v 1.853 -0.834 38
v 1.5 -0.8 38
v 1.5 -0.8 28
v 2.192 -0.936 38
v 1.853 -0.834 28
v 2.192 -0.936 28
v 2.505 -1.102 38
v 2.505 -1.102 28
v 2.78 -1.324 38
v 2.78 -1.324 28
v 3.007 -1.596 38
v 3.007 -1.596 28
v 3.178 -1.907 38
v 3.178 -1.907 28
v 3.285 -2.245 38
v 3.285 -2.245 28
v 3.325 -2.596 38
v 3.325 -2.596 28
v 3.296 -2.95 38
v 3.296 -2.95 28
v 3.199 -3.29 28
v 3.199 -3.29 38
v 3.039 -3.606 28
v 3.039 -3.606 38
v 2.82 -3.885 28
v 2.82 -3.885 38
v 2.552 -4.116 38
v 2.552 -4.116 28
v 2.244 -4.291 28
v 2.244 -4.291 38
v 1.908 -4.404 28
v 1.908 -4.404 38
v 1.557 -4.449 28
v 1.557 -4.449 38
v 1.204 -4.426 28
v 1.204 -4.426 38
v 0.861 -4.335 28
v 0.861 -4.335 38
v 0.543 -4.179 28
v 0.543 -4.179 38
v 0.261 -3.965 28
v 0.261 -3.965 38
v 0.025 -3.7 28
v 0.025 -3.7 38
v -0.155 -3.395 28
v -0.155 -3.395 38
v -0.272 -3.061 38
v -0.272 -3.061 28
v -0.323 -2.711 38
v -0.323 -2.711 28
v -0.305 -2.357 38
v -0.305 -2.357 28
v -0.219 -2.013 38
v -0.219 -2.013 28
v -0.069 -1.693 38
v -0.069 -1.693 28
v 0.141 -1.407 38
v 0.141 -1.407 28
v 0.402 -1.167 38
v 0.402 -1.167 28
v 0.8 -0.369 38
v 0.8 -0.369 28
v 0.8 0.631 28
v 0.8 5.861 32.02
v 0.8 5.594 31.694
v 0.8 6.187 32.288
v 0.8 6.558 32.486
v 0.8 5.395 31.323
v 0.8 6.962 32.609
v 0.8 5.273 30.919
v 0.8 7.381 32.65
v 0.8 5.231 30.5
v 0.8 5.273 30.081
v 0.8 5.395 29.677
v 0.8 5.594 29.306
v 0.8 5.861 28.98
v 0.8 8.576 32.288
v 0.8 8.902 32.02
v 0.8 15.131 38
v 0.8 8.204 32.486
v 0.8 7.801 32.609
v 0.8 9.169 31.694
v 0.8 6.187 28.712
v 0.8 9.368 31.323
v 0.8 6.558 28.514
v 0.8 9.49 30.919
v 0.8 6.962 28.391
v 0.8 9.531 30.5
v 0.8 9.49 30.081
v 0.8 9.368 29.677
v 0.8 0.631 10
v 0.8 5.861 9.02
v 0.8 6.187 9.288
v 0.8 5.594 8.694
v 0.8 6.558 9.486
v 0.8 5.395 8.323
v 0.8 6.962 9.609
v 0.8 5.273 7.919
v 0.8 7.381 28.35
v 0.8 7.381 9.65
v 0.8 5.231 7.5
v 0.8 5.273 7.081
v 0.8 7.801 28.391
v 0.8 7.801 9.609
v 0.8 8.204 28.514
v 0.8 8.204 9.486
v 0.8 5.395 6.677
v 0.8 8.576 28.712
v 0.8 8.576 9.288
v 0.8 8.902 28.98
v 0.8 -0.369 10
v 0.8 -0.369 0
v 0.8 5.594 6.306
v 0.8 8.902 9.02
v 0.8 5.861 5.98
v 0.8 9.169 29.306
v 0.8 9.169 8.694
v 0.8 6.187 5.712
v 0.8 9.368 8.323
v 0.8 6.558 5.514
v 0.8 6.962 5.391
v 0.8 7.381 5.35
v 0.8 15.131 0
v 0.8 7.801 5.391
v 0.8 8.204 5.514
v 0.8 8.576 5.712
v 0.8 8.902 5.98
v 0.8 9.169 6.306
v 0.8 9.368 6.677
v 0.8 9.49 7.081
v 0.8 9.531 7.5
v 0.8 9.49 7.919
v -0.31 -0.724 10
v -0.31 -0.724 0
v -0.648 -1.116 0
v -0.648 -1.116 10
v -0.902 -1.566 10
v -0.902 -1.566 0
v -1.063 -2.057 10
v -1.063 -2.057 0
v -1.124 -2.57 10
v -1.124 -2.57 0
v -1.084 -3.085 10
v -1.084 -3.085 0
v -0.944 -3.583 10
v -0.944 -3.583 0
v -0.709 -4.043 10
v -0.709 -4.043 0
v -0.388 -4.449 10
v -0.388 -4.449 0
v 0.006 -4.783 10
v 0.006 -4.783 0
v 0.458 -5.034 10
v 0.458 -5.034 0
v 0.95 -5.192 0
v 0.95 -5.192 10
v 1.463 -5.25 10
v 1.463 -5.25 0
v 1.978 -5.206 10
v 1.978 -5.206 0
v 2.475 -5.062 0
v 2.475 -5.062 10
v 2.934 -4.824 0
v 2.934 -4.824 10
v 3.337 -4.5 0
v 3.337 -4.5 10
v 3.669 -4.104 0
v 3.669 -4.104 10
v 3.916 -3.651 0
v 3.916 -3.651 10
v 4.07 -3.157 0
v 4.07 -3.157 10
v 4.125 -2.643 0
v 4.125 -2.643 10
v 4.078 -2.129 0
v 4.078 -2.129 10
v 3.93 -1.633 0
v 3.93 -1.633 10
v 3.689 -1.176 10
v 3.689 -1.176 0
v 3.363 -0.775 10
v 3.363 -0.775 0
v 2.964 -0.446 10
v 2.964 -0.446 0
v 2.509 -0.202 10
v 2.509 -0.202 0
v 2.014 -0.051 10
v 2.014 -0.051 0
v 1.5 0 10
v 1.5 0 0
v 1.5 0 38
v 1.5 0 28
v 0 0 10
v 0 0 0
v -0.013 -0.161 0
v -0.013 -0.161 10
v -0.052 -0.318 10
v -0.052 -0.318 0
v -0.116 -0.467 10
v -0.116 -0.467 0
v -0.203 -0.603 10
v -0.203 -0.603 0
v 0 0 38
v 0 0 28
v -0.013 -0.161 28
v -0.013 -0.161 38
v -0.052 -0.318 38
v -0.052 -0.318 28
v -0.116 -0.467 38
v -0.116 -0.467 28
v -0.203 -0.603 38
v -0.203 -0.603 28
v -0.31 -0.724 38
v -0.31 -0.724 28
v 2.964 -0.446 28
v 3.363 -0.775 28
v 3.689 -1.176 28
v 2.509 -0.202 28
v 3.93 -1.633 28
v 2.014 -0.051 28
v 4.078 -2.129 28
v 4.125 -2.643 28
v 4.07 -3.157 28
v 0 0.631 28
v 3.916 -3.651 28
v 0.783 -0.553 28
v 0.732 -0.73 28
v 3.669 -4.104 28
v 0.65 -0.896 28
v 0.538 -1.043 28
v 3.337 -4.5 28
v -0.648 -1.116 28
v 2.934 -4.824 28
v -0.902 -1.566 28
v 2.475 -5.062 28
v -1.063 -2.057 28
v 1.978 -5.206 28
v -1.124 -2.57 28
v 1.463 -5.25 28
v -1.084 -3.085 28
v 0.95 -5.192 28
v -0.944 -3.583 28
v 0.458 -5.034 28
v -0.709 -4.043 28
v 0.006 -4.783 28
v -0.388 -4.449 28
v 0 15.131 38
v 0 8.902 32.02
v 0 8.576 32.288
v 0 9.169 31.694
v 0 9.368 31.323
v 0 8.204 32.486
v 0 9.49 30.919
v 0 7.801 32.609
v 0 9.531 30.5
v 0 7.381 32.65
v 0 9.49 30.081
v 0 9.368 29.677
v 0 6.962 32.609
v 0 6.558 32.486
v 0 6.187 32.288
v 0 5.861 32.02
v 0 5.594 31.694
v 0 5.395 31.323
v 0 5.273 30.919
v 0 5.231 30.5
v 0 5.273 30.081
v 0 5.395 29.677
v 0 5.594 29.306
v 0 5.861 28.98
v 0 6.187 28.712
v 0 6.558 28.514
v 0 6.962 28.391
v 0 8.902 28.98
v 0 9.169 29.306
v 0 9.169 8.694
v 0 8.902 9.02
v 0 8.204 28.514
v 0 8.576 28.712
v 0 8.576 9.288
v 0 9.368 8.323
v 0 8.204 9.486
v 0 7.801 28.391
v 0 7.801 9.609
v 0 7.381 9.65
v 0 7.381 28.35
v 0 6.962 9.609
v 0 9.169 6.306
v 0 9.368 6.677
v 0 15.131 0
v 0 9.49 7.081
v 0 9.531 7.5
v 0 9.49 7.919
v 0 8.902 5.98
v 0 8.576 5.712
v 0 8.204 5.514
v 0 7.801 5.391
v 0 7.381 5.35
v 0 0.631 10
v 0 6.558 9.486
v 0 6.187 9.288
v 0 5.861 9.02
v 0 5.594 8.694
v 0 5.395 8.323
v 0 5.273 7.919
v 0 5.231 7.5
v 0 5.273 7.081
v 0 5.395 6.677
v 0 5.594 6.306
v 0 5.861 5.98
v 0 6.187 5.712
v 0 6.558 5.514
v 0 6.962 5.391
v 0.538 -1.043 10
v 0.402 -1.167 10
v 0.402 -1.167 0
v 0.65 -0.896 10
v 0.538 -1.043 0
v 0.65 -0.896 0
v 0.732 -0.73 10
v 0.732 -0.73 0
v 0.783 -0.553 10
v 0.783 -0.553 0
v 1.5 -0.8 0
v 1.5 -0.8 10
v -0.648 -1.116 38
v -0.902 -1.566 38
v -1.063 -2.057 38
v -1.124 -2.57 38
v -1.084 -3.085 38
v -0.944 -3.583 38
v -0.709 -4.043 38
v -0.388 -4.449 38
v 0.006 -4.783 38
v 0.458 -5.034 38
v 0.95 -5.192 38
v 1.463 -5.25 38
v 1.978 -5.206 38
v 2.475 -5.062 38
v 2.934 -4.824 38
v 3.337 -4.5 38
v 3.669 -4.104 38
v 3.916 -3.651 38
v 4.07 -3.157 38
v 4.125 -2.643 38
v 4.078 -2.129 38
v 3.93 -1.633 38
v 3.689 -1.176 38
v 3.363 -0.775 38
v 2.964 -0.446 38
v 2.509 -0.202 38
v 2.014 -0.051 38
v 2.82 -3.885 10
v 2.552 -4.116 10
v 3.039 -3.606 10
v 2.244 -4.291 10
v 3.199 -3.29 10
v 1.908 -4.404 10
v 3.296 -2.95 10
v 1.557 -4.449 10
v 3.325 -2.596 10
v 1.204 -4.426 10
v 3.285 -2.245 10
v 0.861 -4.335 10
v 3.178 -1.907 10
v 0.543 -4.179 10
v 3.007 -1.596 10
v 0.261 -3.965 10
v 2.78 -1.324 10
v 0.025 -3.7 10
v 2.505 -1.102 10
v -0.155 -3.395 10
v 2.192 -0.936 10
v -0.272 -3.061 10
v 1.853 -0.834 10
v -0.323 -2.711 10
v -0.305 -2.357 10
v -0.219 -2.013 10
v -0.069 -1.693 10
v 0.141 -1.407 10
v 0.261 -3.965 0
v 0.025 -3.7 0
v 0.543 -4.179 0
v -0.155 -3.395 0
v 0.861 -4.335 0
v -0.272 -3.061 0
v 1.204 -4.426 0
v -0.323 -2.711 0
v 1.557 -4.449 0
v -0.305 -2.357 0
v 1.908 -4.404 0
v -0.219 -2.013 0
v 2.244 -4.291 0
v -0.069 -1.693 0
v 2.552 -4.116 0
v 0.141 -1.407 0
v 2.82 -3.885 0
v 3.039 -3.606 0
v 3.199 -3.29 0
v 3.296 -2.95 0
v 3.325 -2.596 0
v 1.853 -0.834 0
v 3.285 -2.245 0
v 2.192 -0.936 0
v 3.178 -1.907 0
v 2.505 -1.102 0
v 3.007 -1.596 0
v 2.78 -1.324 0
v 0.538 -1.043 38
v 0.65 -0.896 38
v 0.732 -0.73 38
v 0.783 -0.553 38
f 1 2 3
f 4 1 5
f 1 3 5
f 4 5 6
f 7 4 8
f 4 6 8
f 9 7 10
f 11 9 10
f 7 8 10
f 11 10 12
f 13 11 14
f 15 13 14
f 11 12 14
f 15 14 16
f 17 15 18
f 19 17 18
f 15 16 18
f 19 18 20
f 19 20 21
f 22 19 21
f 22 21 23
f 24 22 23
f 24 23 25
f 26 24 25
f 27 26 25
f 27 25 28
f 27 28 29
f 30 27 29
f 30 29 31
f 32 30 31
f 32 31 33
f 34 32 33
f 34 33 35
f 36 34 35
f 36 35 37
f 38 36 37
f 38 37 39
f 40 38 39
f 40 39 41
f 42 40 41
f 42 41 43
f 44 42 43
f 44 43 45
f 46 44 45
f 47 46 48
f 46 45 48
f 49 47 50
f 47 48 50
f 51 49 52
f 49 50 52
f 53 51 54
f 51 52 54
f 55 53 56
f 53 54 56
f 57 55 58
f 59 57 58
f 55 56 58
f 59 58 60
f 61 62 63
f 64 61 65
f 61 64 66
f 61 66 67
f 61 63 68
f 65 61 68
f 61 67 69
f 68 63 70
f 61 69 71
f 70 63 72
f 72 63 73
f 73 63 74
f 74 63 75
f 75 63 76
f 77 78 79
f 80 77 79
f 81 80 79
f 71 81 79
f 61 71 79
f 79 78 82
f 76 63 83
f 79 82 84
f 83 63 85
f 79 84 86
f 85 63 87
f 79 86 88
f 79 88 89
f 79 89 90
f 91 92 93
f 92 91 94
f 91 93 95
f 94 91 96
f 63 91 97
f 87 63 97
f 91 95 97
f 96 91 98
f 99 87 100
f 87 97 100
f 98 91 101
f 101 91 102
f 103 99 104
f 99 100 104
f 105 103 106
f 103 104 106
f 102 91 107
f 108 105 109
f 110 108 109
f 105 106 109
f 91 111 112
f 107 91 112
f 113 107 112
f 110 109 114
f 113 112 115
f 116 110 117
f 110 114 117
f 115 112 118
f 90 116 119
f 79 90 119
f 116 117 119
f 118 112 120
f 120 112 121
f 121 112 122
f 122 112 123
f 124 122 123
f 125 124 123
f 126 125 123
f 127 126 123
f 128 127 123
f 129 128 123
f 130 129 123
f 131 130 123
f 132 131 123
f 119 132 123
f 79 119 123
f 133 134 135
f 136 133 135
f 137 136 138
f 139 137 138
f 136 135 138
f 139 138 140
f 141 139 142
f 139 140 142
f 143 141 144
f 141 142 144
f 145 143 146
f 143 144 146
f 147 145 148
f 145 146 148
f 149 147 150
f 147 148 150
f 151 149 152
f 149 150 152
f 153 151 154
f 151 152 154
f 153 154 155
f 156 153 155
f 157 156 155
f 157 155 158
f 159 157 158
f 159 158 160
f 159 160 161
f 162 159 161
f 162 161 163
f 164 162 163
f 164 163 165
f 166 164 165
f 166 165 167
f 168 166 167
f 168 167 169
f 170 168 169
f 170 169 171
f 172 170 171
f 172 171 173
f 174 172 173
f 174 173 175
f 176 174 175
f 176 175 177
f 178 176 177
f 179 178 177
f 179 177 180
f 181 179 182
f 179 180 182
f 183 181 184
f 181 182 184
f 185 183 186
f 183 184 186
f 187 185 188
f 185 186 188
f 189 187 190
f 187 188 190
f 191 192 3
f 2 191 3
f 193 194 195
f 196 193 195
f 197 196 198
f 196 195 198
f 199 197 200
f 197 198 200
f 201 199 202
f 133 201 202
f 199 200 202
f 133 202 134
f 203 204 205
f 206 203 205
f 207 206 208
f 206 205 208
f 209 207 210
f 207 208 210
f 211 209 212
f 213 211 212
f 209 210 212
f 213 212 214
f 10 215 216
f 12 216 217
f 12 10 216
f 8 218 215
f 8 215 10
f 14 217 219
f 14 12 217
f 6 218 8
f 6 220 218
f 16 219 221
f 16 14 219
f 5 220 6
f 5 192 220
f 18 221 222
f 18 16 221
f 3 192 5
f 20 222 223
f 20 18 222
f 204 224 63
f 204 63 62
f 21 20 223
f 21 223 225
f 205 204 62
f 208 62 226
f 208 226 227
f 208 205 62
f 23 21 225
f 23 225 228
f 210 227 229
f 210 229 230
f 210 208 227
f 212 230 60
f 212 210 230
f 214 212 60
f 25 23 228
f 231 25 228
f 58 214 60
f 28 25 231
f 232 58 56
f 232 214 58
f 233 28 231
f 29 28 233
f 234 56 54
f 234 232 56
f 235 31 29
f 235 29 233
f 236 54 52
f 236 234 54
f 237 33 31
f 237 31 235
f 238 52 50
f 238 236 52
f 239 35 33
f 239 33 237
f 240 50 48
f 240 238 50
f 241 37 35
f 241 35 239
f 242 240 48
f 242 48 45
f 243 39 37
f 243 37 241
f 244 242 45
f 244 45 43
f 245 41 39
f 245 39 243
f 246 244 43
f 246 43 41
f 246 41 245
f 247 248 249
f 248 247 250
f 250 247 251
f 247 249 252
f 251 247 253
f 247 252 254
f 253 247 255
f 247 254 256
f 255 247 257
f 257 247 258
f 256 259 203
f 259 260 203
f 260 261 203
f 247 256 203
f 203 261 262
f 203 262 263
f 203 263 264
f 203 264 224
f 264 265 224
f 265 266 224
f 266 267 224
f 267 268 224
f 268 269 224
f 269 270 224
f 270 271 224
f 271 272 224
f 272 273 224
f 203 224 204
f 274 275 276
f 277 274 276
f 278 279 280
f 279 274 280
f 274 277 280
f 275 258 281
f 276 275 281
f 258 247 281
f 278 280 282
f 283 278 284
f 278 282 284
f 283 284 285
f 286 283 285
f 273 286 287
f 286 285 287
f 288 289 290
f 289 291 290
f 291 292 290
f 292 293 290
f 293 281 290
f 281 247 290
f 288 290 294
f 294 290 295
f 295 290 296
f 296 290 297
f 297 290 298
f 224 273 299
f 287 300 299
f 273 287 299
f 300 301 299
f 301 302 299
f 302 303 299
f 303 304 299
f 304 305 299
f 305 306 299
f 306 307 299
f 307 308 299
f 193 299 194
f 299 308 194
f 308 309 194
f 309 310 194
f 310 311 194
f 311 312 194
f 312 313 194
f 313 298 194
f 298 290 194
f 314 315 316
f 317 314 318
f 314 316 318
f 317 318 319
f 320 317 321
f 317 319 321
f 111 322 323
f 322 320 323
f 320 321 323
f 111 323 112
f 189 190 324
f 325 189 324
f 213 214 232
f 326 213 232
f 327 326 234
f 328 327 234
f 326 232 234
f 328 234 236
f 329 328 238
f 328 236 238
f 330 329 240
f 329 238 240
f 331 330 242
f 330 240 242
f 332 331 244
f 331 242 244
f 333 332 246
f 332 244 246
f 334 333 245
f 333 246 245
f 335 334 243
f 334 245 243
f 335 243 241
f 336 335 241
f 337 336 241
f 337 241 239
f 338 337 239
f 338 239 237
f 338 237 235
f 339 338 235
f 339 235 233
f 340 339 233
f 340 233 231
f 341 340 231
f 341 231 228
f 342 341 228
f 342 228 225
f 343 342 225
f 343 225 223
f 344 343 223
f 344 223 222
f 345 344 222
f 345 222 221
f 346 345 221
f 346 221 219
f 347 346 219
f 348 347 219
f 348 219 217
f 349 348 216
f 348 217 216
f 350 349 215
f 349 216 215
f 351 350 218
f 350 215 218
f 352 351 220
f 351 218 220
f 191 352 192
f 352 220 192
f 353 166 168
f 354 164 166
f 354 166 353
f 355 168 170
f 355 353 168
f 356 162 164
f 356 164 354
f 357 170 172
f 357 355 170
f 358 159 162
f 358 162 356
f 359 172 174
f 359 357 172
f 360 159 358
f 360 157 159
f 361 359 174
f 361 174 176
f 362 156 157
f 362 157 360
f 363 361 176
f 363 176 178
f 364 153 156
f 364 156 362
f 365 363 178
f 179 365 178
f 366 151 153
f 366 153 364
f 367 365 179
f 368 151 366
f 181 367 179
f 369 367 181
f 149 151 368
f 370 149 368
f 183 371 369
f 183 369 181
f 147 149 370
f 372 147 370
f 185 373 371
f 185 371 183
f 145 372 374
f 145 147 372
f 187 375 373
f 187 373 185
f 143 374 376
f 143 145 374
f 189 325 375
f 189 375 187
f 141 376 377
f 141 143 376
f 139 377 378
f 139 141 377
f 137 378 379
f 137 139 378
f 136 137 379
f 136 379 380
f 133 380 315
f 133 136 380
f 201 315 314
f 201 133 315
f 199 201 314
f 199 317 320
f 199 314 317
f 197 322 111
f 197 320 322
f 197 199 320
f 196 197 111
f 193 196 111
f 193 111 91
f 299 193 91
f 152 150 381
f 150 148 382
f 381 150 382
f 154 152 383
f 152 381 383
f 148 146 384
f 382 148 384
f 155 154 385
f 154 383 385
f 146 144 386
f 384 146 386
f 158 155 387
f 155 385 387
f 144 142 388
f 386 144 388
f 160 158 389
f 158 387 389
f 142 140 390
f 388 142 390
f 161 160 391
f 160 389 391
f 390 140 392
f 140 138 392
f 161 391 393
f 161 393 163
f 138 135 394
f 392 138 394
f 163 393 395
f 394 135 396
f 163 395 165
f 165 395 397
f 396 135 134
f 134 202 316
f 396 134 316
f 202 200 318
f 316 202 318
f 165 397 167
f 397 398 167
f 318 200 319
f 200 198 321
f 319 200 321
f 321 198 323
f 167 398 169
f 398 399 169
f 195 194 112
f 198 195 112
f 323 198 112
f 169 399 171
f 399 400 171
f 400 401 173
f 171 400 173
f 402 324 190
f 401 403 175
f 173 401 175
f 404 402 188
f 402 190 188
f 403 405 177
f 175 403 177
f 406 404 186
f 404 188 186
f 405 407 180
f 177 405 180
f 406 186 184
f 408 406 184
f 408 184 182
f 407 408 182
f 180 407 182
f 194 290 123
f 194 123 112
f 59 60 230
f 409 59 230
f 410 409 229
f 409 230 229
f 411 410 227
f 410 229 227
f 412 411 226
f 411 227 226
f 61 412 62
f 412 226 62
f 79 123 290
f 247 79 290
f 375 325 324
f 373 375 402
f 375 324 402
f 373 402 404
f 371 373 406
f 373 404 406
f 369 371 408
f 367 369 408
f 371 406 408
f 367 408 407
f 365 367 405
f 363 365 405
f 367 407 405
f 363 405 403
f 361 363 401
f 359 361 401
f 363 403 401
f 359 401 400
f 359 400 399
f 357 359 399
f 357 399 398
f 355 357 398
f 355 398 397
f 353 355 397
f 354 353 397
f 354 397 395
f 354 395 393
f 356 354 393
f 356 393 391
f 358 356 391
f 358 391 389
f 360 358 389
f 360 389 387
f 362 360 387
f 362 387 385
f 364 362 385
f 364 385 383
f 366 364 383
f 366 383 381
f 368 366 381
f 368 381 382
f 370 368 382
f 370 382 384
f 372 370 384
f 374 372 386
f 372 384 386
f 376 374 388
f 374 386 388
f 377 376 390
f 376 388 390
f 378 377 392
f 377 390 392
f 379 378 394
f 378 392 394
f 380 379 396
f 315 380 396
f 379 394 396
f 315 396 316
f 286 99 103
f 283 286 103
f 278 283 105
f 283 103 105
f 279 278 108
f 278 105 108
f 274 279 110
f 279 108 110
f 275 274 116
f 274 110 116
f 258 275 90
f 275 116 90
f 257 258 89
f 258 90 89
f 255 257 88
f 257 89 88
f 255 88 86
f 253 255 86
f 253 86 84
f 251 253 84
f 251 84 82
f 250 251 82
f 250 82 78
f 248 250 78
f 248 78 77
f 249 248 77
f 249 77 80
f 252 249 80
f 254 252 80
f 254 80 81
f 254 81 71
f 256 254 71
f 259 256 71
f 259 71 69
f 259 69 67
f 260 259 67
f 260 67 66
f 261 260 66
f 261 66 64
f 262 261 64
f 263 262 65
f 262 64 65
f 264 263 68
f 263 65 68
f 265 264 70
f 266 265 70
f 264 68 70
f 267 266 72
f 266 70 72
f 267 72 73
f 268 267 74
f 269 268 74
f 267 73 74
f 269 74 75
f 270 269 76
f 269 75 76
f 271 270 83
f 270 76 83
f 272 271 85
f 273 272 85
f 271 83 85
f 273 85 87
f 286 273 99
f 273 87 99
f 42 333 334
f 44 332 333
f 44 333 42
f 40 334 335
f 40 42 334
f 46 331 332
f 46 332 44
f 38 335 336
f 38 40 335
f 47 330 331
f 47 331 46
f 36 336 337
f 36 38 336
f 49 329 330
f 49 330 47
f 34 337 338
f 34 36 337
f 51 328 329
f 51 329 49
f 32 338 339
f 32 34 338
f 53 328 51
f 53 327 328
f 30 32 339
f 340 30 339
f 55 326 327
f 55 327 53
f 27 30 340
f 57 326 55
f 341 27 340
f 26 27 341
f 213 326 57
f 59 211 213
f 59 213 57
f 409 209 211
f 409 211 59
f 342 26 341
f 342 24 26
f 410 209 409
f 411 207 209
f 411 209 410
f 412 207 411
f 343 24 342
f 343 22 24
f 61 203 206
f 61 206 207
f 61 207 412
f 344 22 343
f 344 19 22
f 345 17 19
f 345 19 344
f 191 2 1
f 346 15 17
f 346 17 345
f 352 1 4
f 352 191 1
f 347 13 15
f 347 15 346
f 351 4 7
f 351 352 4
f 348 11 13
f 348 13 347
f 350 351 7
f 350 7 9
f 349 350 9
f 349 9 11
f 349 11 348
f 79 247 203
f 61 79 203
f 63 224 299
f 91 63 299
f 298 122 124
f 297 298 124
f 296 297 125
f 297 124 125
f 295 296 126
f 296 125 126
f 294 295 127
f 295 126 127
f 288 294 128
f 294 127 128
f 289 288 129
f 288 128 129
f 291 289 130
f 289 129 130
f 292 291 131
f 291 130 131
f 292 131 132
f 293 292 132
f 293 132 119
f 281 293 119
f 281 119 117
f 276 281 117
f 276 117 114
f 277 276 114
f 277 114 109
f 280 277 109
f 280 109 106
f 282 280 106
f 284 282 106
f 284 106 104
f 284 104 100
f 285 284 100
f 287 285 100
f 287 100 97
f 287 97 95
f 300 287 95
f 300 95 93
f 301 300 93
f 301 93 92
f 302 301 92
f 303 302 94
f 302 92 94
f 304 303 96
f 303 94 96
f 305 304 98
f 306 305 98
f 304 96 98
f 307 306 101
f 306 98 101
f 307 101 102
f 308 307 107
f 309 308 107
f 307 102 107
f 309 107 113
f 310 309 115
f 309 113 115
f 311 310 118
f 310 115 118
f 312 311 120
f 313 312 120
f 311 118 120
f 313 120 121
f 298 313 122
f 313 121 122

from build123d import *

# Parameters (mm, degrees)
BOSS_EXTRUDE1_DEPTH     = 38
CUT_EXTRUDE1_REACH      = 43.037
SKETCH2_R               = 2.15
CUT_EXTRUDE4_DEPTH      = 42.036691991
CUT_EXTRUDE4_DEPTH_BACK = 42.036691991
SKETCH3_W               = 18
SKETCH3_H               = 1
SKETCH3_H_2             = 4.881241343


with BuildPart() as part:
    # Sketch1 → Boss-Extrude1 (new body)
    with BuildSketch(Plane.XY):
        with BuildLine():
            Line((0.8, -0.368758657), (0.8, 15.131241343))
            Line((0.8, 15.131241343), (0, 15.131241343))
            Line((0, 15.131241343), (0, 0))
            ThreePointArc((0, 0), (-0.08085497, -0.393919299), (-0.310344828, -0.724137931))
            ThreePointArc((-0.310344828, -0.724137931), (2.474900525, -5.062251314), (1.5, 0))
            Line((1.5, 0), (1.5, -0.8))
            ThreePointArc((1.5, -0.8), (2.079032119, -4.355707025), (0.401769912, -1.167428159))
            ThreePointArc((0.401769912, -1.167428159), (0.69492176, -0.814981745), (0.8, -0.368758657))
        make_face()
    extrude(amount=BOSS_EXTRUDE1_DEPTH)

    # Sketch2 → Cut-Extrude1 (cut, up to next)
    with BuildSketch(Plane(origin=(0.8, 0, 0), x_dir=(0, 0, -1), z_dir=(1, 0, 0)), mode=Mode.PRIVATE) as cut_extrude1_sk1:
        with Locations((-30.5, 7.381241343)):
            Circle(SKETCH2_R)
    cut_extrude1_tool1 = extrude(cut_extrude1_sk1.sketch, amount=-CUT_EXTRUDE1_REACH, mode=Mode.PRIVATE) & part.part
    # Sketch2 → Cut-Extrude1 (cut, up to next)
    with BuildSketch(Plane(origin=(0.8, 0, 0), x_dir=(0, 0, -1), z_dir=(1, 0, 0)), mode=Mode.PRIVATE) as cut_extrude1_sk2:
        with Locations((-7.5, 7.381241343)):
            Circle(SKETCH2_R)
    cut_extrude1_tool2 = extrude(cut_extrude1_sk2.sketch, amount=-CUT_EXTRUDE1_REACH, mode=Mode.PRIVATE) & part.part
    add(cut_extrude1_tool1.solids().sort_by_distance((0.8, 7.381241, 30.5))[0], mode=Mode.SUBTRACT)
    add(cut_extrude1_tool2.solids().sort_by_distance((0.8, 7.381241, 7.5))[0], mode=Mode.SUBTRACT)

    # Sketch3 → Cut-Extrude4 (cut, two sides: drawn at the far end of the back side and taken through both)
    with BuildSketch(Plane(origin=(0.8, 0, 0), x_dir=(0, 0, -1), z_dir=(1, 0, 0)).offset(-CUT_EXTRUDE4_DEPTH_BACK)):
        with Locations((-19, 0.131241343)):
            Rectangle(SKETCH3_W, SKETCH3_H)
        with Locations((-19, -2.809379328)):
            Rectangle(SKETCH3_W, SKETCH3_H_2)
    extrude(amount=CUT_EXTRUDE4_DEPTH + CUT_EXTRUDE4_DEPTH_BACK, mode=Mode.SUBTRACT)


solid = part.part
